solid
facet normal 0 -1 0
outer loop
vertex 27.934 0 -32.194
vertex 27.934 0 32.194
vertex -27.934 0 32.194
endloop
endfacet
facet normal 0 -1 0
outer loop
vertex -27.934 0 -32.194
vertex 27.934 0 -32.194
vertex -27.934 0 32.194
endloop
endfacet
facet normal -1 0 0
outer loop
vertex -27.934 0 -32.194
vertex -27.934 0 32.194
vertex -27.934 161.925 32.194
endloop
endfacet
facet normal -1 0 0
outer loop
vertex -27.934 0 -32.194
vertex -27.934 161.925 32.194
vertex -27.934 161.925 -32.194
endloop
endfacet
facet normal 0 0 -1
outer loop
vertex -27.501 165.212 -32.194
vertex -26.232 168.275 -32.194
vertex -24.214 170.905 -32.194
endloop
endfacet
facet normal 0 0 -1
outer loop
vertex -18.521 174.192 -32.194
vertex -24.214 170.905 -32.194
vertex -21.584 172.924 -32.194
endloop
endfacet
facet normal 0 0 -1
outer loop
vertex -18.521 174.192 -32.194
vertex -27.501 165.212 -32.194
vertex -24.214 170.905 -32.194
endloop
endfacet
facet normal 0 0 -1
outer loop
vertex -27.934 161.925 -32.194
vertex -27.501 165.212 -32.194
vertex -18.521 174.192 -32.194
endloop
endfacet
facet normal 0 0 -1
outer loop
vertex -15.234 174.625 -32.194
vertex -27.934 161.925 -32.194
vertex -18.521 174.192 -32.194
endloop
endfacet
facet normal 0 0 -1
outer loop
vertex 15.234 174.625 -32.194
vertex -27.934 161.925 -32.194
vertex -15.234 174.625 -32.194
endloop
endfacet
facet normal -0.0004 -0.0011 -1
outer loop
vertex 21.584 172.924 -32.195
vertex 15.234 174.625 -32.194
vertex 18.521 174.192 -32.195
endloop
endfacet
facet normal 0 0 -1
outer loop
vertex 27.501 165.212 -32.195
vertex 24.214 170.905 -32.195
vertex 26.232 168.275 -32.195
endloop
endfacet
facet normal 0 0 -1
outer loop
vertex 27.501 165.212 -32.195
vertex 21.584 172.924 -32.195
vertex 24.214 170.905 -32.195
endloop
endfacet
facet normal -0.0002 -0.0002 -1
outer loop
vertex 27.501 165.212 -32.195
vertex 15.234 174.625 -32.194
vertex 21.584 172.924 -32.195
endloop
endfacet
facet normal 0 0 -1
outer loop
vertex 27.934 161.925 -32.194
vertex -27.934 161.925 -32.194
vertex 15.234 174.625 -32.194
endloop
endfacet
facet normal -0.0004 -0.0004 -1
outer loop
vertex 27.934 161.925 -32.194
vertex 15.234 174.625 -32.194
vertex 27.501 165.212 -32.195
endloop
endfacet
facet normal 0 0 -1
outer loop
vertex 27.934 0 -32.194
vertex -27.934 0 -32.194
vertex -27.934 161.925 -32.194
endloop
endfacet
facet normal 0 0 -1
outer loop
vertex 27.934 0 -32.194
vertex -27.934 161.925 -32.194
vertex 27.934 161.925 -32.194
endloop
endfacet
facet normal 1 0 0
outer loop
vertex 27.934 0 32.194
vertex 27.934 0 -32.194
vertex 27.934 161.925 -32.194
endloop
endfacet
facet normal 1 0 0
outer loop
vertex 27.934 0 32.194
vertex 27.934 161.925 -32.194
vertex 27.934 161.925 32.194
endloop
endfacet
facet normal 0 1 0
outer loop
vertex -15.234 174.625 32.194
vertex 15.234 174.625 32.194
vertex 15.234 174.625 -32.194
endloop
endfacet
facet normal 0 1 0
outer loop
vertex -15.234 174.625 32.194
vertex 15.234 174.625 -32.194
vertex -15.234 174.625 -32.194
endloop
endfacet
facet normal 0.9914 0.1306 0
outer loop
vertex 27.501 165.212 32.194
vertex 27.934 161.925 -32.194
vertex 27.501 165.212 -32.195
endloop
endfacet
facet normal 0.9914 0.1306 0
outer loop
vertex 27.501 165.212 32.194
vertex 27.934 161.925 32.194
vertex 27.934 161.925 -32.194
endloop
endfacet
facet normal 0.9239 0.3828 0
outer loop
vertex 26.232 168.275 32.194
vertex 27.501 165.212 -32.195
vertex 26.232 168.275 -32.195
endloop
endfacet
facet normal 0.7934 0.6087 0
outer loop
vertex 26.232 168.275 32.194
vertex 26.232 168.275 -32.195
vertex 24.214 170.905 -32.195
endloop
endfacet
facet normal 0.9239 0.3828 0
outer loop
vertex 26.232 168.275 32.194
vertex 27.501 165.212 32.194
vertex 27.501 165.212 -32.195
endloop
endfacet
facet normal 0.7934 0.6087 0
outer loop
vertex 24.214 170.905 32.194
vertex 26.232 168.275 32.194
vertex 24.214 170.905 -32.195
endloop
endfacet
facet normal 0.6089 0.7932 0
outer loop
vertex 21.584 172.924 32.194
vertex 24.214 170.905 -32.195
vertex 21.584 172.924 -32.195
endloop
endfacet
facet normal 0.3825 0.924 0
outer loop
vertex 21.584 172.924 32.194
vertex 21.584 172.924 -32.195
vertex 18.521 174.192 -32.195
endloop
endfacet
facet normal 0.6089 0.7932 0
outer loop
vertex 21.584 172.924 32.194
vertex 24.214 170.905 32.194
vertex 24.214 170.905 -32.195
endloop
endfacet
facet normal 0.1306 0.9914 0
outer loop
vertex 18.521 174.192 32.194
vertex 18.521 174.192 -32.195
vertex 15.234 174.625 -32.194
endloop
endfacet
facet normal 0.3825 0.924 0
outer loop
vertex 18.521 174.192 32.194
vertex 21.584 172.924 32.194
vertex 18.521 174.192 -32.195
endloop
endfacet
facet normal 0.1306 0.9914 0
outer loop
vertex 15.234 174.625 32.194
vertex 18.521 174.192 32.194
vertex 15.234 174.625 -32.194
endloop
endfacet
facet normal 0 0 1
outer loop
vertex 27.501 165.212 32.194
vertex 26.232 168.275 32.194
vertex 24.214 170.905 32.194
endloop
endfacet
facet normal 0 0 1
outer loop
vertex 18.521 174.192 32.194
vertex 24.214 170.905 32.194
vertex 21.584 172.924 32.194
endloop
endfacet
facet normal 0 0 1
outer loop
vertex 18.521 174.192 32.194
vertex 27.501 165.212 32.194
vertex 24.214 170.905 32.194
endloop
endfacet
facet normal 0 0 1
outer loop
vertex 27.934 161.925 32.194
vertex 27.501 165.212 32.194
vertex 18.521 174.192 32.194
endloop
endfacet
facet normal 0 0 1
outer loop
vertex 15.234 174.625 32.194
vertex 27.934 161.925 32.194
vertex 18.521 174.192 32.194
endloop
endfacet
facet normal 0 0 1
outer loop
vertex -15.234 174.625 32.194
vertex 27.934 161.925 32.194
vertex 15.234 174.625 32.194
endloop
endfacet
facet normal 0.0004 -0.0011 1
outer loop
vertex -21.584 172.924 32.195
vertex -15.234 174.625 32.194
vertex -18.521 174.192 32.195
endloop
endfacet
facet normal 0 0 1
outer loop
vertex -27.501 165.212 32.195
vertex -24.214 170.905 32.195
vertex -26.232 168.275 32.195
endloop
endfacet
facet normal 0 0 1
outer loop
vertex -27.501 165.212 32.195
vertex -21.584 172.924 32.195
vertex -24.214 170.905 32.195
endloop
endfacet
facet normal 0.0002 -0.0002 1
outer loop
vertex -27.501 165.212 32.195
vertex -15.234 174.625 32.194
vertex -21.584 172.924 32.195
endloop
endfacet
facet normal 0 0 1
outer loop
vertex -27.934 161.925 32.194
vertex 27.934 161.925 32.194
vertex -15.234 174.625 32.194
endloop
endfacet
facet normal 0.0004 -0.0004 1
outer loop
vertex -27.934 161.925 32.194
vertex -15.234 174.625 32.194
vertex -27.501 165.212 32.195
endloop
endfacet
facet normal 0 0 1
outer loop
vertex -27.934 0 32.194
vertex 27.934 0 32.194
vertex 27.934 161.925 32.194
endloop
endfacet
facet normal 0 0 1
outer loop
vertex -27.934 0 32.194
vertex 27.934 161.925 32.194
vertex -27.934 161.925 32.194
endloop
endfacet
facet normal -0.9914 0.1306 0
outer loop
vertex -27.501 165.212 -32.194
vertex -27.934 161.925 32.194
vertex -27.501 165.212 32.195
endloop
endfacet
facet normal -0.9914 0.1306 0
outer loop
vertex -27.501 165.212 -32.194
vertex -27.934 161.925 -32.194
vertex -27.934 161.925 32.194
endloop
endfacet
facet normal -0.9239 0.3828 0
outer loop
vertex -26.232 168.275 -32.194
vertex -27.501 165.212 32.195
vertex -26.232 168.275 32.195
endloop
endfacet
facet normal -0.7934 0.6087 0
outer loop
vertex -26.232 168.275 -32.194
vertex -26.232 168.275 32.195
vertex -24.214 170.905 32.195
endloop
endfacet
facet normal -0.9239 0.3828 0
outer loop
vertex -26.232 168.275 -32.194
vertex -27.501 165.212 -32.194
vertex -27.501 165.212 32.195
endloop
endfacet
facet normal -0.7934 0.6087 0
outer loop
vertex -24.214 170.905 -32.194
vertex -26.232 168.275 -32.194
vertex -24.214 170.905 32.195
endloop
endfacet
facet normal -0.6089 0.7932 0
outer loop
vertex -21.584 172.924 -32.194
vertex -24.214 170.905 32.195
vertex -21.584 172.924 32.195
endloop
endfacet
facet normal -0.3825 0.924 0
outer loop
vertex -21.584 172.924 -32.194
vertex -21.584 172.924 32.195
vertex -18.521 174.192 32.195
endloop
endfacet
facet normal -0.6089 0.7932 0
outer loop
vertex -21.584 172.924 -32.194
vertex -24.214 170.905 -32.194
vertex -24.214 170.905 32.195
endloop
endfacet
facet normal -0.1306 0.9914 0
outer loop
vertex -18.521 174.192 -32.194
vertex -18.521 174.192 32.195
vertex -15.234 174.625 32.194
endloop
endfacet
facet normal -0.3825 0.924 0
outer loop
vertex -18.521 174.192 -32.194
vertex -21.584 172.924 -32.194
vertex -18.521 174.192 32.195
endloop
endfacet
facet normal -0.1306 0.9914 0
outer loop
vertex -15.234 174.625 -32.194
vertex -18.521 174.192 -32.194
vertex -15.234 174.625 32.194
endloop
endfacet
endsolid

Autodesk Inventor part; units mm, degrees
ref_plane "YZ Plane" through (0, 0, 0) normal (1, 0, 0) x (0, 1, 0)
ref_plane "XZ Plane" through (0, 0, 0) normal (0, 1, 0) x (-1, 0, 0)
ref_plane "XY Plane" through (0, 0, 0) normal (0, 0, 1) x (1, 0, 0)
sketch "Sketch1" plane through (0, 0, 0) normal (0, 1, 0) x (-1, 0, 0)
  line L0 (-27.9337, 32.1945) -> (27.9336, 32.1945)
  line L1 (27.9336, 32.1945) -> (27.9337, -32.1945)
  line L2 (27.9337, -32.1945) -> (-27.9336, -32.1945)
  line L3 (-27.9336, -32.1945) -> (-27.9337, 32.1945)
  line L4 (-27.9337, 32.1945) -> (27.9337, -32.1945) construction
  line L5 (27.9336, 32.1945) -> (-27.9336, -32.1945) construction
  point P0 (0, 0)
  dimension "d0" = 64.389
  dimension "d1" = 55.8673
extrude "Extrusion1" add sketch "Sketch1" along normal blind 174.625
fillet "Fillet1" radius 12.7 2 edges at (-27.9337, 174.625, 0) (27.9337, 174.625, 0)
properties part number "10000 mAh battery"
